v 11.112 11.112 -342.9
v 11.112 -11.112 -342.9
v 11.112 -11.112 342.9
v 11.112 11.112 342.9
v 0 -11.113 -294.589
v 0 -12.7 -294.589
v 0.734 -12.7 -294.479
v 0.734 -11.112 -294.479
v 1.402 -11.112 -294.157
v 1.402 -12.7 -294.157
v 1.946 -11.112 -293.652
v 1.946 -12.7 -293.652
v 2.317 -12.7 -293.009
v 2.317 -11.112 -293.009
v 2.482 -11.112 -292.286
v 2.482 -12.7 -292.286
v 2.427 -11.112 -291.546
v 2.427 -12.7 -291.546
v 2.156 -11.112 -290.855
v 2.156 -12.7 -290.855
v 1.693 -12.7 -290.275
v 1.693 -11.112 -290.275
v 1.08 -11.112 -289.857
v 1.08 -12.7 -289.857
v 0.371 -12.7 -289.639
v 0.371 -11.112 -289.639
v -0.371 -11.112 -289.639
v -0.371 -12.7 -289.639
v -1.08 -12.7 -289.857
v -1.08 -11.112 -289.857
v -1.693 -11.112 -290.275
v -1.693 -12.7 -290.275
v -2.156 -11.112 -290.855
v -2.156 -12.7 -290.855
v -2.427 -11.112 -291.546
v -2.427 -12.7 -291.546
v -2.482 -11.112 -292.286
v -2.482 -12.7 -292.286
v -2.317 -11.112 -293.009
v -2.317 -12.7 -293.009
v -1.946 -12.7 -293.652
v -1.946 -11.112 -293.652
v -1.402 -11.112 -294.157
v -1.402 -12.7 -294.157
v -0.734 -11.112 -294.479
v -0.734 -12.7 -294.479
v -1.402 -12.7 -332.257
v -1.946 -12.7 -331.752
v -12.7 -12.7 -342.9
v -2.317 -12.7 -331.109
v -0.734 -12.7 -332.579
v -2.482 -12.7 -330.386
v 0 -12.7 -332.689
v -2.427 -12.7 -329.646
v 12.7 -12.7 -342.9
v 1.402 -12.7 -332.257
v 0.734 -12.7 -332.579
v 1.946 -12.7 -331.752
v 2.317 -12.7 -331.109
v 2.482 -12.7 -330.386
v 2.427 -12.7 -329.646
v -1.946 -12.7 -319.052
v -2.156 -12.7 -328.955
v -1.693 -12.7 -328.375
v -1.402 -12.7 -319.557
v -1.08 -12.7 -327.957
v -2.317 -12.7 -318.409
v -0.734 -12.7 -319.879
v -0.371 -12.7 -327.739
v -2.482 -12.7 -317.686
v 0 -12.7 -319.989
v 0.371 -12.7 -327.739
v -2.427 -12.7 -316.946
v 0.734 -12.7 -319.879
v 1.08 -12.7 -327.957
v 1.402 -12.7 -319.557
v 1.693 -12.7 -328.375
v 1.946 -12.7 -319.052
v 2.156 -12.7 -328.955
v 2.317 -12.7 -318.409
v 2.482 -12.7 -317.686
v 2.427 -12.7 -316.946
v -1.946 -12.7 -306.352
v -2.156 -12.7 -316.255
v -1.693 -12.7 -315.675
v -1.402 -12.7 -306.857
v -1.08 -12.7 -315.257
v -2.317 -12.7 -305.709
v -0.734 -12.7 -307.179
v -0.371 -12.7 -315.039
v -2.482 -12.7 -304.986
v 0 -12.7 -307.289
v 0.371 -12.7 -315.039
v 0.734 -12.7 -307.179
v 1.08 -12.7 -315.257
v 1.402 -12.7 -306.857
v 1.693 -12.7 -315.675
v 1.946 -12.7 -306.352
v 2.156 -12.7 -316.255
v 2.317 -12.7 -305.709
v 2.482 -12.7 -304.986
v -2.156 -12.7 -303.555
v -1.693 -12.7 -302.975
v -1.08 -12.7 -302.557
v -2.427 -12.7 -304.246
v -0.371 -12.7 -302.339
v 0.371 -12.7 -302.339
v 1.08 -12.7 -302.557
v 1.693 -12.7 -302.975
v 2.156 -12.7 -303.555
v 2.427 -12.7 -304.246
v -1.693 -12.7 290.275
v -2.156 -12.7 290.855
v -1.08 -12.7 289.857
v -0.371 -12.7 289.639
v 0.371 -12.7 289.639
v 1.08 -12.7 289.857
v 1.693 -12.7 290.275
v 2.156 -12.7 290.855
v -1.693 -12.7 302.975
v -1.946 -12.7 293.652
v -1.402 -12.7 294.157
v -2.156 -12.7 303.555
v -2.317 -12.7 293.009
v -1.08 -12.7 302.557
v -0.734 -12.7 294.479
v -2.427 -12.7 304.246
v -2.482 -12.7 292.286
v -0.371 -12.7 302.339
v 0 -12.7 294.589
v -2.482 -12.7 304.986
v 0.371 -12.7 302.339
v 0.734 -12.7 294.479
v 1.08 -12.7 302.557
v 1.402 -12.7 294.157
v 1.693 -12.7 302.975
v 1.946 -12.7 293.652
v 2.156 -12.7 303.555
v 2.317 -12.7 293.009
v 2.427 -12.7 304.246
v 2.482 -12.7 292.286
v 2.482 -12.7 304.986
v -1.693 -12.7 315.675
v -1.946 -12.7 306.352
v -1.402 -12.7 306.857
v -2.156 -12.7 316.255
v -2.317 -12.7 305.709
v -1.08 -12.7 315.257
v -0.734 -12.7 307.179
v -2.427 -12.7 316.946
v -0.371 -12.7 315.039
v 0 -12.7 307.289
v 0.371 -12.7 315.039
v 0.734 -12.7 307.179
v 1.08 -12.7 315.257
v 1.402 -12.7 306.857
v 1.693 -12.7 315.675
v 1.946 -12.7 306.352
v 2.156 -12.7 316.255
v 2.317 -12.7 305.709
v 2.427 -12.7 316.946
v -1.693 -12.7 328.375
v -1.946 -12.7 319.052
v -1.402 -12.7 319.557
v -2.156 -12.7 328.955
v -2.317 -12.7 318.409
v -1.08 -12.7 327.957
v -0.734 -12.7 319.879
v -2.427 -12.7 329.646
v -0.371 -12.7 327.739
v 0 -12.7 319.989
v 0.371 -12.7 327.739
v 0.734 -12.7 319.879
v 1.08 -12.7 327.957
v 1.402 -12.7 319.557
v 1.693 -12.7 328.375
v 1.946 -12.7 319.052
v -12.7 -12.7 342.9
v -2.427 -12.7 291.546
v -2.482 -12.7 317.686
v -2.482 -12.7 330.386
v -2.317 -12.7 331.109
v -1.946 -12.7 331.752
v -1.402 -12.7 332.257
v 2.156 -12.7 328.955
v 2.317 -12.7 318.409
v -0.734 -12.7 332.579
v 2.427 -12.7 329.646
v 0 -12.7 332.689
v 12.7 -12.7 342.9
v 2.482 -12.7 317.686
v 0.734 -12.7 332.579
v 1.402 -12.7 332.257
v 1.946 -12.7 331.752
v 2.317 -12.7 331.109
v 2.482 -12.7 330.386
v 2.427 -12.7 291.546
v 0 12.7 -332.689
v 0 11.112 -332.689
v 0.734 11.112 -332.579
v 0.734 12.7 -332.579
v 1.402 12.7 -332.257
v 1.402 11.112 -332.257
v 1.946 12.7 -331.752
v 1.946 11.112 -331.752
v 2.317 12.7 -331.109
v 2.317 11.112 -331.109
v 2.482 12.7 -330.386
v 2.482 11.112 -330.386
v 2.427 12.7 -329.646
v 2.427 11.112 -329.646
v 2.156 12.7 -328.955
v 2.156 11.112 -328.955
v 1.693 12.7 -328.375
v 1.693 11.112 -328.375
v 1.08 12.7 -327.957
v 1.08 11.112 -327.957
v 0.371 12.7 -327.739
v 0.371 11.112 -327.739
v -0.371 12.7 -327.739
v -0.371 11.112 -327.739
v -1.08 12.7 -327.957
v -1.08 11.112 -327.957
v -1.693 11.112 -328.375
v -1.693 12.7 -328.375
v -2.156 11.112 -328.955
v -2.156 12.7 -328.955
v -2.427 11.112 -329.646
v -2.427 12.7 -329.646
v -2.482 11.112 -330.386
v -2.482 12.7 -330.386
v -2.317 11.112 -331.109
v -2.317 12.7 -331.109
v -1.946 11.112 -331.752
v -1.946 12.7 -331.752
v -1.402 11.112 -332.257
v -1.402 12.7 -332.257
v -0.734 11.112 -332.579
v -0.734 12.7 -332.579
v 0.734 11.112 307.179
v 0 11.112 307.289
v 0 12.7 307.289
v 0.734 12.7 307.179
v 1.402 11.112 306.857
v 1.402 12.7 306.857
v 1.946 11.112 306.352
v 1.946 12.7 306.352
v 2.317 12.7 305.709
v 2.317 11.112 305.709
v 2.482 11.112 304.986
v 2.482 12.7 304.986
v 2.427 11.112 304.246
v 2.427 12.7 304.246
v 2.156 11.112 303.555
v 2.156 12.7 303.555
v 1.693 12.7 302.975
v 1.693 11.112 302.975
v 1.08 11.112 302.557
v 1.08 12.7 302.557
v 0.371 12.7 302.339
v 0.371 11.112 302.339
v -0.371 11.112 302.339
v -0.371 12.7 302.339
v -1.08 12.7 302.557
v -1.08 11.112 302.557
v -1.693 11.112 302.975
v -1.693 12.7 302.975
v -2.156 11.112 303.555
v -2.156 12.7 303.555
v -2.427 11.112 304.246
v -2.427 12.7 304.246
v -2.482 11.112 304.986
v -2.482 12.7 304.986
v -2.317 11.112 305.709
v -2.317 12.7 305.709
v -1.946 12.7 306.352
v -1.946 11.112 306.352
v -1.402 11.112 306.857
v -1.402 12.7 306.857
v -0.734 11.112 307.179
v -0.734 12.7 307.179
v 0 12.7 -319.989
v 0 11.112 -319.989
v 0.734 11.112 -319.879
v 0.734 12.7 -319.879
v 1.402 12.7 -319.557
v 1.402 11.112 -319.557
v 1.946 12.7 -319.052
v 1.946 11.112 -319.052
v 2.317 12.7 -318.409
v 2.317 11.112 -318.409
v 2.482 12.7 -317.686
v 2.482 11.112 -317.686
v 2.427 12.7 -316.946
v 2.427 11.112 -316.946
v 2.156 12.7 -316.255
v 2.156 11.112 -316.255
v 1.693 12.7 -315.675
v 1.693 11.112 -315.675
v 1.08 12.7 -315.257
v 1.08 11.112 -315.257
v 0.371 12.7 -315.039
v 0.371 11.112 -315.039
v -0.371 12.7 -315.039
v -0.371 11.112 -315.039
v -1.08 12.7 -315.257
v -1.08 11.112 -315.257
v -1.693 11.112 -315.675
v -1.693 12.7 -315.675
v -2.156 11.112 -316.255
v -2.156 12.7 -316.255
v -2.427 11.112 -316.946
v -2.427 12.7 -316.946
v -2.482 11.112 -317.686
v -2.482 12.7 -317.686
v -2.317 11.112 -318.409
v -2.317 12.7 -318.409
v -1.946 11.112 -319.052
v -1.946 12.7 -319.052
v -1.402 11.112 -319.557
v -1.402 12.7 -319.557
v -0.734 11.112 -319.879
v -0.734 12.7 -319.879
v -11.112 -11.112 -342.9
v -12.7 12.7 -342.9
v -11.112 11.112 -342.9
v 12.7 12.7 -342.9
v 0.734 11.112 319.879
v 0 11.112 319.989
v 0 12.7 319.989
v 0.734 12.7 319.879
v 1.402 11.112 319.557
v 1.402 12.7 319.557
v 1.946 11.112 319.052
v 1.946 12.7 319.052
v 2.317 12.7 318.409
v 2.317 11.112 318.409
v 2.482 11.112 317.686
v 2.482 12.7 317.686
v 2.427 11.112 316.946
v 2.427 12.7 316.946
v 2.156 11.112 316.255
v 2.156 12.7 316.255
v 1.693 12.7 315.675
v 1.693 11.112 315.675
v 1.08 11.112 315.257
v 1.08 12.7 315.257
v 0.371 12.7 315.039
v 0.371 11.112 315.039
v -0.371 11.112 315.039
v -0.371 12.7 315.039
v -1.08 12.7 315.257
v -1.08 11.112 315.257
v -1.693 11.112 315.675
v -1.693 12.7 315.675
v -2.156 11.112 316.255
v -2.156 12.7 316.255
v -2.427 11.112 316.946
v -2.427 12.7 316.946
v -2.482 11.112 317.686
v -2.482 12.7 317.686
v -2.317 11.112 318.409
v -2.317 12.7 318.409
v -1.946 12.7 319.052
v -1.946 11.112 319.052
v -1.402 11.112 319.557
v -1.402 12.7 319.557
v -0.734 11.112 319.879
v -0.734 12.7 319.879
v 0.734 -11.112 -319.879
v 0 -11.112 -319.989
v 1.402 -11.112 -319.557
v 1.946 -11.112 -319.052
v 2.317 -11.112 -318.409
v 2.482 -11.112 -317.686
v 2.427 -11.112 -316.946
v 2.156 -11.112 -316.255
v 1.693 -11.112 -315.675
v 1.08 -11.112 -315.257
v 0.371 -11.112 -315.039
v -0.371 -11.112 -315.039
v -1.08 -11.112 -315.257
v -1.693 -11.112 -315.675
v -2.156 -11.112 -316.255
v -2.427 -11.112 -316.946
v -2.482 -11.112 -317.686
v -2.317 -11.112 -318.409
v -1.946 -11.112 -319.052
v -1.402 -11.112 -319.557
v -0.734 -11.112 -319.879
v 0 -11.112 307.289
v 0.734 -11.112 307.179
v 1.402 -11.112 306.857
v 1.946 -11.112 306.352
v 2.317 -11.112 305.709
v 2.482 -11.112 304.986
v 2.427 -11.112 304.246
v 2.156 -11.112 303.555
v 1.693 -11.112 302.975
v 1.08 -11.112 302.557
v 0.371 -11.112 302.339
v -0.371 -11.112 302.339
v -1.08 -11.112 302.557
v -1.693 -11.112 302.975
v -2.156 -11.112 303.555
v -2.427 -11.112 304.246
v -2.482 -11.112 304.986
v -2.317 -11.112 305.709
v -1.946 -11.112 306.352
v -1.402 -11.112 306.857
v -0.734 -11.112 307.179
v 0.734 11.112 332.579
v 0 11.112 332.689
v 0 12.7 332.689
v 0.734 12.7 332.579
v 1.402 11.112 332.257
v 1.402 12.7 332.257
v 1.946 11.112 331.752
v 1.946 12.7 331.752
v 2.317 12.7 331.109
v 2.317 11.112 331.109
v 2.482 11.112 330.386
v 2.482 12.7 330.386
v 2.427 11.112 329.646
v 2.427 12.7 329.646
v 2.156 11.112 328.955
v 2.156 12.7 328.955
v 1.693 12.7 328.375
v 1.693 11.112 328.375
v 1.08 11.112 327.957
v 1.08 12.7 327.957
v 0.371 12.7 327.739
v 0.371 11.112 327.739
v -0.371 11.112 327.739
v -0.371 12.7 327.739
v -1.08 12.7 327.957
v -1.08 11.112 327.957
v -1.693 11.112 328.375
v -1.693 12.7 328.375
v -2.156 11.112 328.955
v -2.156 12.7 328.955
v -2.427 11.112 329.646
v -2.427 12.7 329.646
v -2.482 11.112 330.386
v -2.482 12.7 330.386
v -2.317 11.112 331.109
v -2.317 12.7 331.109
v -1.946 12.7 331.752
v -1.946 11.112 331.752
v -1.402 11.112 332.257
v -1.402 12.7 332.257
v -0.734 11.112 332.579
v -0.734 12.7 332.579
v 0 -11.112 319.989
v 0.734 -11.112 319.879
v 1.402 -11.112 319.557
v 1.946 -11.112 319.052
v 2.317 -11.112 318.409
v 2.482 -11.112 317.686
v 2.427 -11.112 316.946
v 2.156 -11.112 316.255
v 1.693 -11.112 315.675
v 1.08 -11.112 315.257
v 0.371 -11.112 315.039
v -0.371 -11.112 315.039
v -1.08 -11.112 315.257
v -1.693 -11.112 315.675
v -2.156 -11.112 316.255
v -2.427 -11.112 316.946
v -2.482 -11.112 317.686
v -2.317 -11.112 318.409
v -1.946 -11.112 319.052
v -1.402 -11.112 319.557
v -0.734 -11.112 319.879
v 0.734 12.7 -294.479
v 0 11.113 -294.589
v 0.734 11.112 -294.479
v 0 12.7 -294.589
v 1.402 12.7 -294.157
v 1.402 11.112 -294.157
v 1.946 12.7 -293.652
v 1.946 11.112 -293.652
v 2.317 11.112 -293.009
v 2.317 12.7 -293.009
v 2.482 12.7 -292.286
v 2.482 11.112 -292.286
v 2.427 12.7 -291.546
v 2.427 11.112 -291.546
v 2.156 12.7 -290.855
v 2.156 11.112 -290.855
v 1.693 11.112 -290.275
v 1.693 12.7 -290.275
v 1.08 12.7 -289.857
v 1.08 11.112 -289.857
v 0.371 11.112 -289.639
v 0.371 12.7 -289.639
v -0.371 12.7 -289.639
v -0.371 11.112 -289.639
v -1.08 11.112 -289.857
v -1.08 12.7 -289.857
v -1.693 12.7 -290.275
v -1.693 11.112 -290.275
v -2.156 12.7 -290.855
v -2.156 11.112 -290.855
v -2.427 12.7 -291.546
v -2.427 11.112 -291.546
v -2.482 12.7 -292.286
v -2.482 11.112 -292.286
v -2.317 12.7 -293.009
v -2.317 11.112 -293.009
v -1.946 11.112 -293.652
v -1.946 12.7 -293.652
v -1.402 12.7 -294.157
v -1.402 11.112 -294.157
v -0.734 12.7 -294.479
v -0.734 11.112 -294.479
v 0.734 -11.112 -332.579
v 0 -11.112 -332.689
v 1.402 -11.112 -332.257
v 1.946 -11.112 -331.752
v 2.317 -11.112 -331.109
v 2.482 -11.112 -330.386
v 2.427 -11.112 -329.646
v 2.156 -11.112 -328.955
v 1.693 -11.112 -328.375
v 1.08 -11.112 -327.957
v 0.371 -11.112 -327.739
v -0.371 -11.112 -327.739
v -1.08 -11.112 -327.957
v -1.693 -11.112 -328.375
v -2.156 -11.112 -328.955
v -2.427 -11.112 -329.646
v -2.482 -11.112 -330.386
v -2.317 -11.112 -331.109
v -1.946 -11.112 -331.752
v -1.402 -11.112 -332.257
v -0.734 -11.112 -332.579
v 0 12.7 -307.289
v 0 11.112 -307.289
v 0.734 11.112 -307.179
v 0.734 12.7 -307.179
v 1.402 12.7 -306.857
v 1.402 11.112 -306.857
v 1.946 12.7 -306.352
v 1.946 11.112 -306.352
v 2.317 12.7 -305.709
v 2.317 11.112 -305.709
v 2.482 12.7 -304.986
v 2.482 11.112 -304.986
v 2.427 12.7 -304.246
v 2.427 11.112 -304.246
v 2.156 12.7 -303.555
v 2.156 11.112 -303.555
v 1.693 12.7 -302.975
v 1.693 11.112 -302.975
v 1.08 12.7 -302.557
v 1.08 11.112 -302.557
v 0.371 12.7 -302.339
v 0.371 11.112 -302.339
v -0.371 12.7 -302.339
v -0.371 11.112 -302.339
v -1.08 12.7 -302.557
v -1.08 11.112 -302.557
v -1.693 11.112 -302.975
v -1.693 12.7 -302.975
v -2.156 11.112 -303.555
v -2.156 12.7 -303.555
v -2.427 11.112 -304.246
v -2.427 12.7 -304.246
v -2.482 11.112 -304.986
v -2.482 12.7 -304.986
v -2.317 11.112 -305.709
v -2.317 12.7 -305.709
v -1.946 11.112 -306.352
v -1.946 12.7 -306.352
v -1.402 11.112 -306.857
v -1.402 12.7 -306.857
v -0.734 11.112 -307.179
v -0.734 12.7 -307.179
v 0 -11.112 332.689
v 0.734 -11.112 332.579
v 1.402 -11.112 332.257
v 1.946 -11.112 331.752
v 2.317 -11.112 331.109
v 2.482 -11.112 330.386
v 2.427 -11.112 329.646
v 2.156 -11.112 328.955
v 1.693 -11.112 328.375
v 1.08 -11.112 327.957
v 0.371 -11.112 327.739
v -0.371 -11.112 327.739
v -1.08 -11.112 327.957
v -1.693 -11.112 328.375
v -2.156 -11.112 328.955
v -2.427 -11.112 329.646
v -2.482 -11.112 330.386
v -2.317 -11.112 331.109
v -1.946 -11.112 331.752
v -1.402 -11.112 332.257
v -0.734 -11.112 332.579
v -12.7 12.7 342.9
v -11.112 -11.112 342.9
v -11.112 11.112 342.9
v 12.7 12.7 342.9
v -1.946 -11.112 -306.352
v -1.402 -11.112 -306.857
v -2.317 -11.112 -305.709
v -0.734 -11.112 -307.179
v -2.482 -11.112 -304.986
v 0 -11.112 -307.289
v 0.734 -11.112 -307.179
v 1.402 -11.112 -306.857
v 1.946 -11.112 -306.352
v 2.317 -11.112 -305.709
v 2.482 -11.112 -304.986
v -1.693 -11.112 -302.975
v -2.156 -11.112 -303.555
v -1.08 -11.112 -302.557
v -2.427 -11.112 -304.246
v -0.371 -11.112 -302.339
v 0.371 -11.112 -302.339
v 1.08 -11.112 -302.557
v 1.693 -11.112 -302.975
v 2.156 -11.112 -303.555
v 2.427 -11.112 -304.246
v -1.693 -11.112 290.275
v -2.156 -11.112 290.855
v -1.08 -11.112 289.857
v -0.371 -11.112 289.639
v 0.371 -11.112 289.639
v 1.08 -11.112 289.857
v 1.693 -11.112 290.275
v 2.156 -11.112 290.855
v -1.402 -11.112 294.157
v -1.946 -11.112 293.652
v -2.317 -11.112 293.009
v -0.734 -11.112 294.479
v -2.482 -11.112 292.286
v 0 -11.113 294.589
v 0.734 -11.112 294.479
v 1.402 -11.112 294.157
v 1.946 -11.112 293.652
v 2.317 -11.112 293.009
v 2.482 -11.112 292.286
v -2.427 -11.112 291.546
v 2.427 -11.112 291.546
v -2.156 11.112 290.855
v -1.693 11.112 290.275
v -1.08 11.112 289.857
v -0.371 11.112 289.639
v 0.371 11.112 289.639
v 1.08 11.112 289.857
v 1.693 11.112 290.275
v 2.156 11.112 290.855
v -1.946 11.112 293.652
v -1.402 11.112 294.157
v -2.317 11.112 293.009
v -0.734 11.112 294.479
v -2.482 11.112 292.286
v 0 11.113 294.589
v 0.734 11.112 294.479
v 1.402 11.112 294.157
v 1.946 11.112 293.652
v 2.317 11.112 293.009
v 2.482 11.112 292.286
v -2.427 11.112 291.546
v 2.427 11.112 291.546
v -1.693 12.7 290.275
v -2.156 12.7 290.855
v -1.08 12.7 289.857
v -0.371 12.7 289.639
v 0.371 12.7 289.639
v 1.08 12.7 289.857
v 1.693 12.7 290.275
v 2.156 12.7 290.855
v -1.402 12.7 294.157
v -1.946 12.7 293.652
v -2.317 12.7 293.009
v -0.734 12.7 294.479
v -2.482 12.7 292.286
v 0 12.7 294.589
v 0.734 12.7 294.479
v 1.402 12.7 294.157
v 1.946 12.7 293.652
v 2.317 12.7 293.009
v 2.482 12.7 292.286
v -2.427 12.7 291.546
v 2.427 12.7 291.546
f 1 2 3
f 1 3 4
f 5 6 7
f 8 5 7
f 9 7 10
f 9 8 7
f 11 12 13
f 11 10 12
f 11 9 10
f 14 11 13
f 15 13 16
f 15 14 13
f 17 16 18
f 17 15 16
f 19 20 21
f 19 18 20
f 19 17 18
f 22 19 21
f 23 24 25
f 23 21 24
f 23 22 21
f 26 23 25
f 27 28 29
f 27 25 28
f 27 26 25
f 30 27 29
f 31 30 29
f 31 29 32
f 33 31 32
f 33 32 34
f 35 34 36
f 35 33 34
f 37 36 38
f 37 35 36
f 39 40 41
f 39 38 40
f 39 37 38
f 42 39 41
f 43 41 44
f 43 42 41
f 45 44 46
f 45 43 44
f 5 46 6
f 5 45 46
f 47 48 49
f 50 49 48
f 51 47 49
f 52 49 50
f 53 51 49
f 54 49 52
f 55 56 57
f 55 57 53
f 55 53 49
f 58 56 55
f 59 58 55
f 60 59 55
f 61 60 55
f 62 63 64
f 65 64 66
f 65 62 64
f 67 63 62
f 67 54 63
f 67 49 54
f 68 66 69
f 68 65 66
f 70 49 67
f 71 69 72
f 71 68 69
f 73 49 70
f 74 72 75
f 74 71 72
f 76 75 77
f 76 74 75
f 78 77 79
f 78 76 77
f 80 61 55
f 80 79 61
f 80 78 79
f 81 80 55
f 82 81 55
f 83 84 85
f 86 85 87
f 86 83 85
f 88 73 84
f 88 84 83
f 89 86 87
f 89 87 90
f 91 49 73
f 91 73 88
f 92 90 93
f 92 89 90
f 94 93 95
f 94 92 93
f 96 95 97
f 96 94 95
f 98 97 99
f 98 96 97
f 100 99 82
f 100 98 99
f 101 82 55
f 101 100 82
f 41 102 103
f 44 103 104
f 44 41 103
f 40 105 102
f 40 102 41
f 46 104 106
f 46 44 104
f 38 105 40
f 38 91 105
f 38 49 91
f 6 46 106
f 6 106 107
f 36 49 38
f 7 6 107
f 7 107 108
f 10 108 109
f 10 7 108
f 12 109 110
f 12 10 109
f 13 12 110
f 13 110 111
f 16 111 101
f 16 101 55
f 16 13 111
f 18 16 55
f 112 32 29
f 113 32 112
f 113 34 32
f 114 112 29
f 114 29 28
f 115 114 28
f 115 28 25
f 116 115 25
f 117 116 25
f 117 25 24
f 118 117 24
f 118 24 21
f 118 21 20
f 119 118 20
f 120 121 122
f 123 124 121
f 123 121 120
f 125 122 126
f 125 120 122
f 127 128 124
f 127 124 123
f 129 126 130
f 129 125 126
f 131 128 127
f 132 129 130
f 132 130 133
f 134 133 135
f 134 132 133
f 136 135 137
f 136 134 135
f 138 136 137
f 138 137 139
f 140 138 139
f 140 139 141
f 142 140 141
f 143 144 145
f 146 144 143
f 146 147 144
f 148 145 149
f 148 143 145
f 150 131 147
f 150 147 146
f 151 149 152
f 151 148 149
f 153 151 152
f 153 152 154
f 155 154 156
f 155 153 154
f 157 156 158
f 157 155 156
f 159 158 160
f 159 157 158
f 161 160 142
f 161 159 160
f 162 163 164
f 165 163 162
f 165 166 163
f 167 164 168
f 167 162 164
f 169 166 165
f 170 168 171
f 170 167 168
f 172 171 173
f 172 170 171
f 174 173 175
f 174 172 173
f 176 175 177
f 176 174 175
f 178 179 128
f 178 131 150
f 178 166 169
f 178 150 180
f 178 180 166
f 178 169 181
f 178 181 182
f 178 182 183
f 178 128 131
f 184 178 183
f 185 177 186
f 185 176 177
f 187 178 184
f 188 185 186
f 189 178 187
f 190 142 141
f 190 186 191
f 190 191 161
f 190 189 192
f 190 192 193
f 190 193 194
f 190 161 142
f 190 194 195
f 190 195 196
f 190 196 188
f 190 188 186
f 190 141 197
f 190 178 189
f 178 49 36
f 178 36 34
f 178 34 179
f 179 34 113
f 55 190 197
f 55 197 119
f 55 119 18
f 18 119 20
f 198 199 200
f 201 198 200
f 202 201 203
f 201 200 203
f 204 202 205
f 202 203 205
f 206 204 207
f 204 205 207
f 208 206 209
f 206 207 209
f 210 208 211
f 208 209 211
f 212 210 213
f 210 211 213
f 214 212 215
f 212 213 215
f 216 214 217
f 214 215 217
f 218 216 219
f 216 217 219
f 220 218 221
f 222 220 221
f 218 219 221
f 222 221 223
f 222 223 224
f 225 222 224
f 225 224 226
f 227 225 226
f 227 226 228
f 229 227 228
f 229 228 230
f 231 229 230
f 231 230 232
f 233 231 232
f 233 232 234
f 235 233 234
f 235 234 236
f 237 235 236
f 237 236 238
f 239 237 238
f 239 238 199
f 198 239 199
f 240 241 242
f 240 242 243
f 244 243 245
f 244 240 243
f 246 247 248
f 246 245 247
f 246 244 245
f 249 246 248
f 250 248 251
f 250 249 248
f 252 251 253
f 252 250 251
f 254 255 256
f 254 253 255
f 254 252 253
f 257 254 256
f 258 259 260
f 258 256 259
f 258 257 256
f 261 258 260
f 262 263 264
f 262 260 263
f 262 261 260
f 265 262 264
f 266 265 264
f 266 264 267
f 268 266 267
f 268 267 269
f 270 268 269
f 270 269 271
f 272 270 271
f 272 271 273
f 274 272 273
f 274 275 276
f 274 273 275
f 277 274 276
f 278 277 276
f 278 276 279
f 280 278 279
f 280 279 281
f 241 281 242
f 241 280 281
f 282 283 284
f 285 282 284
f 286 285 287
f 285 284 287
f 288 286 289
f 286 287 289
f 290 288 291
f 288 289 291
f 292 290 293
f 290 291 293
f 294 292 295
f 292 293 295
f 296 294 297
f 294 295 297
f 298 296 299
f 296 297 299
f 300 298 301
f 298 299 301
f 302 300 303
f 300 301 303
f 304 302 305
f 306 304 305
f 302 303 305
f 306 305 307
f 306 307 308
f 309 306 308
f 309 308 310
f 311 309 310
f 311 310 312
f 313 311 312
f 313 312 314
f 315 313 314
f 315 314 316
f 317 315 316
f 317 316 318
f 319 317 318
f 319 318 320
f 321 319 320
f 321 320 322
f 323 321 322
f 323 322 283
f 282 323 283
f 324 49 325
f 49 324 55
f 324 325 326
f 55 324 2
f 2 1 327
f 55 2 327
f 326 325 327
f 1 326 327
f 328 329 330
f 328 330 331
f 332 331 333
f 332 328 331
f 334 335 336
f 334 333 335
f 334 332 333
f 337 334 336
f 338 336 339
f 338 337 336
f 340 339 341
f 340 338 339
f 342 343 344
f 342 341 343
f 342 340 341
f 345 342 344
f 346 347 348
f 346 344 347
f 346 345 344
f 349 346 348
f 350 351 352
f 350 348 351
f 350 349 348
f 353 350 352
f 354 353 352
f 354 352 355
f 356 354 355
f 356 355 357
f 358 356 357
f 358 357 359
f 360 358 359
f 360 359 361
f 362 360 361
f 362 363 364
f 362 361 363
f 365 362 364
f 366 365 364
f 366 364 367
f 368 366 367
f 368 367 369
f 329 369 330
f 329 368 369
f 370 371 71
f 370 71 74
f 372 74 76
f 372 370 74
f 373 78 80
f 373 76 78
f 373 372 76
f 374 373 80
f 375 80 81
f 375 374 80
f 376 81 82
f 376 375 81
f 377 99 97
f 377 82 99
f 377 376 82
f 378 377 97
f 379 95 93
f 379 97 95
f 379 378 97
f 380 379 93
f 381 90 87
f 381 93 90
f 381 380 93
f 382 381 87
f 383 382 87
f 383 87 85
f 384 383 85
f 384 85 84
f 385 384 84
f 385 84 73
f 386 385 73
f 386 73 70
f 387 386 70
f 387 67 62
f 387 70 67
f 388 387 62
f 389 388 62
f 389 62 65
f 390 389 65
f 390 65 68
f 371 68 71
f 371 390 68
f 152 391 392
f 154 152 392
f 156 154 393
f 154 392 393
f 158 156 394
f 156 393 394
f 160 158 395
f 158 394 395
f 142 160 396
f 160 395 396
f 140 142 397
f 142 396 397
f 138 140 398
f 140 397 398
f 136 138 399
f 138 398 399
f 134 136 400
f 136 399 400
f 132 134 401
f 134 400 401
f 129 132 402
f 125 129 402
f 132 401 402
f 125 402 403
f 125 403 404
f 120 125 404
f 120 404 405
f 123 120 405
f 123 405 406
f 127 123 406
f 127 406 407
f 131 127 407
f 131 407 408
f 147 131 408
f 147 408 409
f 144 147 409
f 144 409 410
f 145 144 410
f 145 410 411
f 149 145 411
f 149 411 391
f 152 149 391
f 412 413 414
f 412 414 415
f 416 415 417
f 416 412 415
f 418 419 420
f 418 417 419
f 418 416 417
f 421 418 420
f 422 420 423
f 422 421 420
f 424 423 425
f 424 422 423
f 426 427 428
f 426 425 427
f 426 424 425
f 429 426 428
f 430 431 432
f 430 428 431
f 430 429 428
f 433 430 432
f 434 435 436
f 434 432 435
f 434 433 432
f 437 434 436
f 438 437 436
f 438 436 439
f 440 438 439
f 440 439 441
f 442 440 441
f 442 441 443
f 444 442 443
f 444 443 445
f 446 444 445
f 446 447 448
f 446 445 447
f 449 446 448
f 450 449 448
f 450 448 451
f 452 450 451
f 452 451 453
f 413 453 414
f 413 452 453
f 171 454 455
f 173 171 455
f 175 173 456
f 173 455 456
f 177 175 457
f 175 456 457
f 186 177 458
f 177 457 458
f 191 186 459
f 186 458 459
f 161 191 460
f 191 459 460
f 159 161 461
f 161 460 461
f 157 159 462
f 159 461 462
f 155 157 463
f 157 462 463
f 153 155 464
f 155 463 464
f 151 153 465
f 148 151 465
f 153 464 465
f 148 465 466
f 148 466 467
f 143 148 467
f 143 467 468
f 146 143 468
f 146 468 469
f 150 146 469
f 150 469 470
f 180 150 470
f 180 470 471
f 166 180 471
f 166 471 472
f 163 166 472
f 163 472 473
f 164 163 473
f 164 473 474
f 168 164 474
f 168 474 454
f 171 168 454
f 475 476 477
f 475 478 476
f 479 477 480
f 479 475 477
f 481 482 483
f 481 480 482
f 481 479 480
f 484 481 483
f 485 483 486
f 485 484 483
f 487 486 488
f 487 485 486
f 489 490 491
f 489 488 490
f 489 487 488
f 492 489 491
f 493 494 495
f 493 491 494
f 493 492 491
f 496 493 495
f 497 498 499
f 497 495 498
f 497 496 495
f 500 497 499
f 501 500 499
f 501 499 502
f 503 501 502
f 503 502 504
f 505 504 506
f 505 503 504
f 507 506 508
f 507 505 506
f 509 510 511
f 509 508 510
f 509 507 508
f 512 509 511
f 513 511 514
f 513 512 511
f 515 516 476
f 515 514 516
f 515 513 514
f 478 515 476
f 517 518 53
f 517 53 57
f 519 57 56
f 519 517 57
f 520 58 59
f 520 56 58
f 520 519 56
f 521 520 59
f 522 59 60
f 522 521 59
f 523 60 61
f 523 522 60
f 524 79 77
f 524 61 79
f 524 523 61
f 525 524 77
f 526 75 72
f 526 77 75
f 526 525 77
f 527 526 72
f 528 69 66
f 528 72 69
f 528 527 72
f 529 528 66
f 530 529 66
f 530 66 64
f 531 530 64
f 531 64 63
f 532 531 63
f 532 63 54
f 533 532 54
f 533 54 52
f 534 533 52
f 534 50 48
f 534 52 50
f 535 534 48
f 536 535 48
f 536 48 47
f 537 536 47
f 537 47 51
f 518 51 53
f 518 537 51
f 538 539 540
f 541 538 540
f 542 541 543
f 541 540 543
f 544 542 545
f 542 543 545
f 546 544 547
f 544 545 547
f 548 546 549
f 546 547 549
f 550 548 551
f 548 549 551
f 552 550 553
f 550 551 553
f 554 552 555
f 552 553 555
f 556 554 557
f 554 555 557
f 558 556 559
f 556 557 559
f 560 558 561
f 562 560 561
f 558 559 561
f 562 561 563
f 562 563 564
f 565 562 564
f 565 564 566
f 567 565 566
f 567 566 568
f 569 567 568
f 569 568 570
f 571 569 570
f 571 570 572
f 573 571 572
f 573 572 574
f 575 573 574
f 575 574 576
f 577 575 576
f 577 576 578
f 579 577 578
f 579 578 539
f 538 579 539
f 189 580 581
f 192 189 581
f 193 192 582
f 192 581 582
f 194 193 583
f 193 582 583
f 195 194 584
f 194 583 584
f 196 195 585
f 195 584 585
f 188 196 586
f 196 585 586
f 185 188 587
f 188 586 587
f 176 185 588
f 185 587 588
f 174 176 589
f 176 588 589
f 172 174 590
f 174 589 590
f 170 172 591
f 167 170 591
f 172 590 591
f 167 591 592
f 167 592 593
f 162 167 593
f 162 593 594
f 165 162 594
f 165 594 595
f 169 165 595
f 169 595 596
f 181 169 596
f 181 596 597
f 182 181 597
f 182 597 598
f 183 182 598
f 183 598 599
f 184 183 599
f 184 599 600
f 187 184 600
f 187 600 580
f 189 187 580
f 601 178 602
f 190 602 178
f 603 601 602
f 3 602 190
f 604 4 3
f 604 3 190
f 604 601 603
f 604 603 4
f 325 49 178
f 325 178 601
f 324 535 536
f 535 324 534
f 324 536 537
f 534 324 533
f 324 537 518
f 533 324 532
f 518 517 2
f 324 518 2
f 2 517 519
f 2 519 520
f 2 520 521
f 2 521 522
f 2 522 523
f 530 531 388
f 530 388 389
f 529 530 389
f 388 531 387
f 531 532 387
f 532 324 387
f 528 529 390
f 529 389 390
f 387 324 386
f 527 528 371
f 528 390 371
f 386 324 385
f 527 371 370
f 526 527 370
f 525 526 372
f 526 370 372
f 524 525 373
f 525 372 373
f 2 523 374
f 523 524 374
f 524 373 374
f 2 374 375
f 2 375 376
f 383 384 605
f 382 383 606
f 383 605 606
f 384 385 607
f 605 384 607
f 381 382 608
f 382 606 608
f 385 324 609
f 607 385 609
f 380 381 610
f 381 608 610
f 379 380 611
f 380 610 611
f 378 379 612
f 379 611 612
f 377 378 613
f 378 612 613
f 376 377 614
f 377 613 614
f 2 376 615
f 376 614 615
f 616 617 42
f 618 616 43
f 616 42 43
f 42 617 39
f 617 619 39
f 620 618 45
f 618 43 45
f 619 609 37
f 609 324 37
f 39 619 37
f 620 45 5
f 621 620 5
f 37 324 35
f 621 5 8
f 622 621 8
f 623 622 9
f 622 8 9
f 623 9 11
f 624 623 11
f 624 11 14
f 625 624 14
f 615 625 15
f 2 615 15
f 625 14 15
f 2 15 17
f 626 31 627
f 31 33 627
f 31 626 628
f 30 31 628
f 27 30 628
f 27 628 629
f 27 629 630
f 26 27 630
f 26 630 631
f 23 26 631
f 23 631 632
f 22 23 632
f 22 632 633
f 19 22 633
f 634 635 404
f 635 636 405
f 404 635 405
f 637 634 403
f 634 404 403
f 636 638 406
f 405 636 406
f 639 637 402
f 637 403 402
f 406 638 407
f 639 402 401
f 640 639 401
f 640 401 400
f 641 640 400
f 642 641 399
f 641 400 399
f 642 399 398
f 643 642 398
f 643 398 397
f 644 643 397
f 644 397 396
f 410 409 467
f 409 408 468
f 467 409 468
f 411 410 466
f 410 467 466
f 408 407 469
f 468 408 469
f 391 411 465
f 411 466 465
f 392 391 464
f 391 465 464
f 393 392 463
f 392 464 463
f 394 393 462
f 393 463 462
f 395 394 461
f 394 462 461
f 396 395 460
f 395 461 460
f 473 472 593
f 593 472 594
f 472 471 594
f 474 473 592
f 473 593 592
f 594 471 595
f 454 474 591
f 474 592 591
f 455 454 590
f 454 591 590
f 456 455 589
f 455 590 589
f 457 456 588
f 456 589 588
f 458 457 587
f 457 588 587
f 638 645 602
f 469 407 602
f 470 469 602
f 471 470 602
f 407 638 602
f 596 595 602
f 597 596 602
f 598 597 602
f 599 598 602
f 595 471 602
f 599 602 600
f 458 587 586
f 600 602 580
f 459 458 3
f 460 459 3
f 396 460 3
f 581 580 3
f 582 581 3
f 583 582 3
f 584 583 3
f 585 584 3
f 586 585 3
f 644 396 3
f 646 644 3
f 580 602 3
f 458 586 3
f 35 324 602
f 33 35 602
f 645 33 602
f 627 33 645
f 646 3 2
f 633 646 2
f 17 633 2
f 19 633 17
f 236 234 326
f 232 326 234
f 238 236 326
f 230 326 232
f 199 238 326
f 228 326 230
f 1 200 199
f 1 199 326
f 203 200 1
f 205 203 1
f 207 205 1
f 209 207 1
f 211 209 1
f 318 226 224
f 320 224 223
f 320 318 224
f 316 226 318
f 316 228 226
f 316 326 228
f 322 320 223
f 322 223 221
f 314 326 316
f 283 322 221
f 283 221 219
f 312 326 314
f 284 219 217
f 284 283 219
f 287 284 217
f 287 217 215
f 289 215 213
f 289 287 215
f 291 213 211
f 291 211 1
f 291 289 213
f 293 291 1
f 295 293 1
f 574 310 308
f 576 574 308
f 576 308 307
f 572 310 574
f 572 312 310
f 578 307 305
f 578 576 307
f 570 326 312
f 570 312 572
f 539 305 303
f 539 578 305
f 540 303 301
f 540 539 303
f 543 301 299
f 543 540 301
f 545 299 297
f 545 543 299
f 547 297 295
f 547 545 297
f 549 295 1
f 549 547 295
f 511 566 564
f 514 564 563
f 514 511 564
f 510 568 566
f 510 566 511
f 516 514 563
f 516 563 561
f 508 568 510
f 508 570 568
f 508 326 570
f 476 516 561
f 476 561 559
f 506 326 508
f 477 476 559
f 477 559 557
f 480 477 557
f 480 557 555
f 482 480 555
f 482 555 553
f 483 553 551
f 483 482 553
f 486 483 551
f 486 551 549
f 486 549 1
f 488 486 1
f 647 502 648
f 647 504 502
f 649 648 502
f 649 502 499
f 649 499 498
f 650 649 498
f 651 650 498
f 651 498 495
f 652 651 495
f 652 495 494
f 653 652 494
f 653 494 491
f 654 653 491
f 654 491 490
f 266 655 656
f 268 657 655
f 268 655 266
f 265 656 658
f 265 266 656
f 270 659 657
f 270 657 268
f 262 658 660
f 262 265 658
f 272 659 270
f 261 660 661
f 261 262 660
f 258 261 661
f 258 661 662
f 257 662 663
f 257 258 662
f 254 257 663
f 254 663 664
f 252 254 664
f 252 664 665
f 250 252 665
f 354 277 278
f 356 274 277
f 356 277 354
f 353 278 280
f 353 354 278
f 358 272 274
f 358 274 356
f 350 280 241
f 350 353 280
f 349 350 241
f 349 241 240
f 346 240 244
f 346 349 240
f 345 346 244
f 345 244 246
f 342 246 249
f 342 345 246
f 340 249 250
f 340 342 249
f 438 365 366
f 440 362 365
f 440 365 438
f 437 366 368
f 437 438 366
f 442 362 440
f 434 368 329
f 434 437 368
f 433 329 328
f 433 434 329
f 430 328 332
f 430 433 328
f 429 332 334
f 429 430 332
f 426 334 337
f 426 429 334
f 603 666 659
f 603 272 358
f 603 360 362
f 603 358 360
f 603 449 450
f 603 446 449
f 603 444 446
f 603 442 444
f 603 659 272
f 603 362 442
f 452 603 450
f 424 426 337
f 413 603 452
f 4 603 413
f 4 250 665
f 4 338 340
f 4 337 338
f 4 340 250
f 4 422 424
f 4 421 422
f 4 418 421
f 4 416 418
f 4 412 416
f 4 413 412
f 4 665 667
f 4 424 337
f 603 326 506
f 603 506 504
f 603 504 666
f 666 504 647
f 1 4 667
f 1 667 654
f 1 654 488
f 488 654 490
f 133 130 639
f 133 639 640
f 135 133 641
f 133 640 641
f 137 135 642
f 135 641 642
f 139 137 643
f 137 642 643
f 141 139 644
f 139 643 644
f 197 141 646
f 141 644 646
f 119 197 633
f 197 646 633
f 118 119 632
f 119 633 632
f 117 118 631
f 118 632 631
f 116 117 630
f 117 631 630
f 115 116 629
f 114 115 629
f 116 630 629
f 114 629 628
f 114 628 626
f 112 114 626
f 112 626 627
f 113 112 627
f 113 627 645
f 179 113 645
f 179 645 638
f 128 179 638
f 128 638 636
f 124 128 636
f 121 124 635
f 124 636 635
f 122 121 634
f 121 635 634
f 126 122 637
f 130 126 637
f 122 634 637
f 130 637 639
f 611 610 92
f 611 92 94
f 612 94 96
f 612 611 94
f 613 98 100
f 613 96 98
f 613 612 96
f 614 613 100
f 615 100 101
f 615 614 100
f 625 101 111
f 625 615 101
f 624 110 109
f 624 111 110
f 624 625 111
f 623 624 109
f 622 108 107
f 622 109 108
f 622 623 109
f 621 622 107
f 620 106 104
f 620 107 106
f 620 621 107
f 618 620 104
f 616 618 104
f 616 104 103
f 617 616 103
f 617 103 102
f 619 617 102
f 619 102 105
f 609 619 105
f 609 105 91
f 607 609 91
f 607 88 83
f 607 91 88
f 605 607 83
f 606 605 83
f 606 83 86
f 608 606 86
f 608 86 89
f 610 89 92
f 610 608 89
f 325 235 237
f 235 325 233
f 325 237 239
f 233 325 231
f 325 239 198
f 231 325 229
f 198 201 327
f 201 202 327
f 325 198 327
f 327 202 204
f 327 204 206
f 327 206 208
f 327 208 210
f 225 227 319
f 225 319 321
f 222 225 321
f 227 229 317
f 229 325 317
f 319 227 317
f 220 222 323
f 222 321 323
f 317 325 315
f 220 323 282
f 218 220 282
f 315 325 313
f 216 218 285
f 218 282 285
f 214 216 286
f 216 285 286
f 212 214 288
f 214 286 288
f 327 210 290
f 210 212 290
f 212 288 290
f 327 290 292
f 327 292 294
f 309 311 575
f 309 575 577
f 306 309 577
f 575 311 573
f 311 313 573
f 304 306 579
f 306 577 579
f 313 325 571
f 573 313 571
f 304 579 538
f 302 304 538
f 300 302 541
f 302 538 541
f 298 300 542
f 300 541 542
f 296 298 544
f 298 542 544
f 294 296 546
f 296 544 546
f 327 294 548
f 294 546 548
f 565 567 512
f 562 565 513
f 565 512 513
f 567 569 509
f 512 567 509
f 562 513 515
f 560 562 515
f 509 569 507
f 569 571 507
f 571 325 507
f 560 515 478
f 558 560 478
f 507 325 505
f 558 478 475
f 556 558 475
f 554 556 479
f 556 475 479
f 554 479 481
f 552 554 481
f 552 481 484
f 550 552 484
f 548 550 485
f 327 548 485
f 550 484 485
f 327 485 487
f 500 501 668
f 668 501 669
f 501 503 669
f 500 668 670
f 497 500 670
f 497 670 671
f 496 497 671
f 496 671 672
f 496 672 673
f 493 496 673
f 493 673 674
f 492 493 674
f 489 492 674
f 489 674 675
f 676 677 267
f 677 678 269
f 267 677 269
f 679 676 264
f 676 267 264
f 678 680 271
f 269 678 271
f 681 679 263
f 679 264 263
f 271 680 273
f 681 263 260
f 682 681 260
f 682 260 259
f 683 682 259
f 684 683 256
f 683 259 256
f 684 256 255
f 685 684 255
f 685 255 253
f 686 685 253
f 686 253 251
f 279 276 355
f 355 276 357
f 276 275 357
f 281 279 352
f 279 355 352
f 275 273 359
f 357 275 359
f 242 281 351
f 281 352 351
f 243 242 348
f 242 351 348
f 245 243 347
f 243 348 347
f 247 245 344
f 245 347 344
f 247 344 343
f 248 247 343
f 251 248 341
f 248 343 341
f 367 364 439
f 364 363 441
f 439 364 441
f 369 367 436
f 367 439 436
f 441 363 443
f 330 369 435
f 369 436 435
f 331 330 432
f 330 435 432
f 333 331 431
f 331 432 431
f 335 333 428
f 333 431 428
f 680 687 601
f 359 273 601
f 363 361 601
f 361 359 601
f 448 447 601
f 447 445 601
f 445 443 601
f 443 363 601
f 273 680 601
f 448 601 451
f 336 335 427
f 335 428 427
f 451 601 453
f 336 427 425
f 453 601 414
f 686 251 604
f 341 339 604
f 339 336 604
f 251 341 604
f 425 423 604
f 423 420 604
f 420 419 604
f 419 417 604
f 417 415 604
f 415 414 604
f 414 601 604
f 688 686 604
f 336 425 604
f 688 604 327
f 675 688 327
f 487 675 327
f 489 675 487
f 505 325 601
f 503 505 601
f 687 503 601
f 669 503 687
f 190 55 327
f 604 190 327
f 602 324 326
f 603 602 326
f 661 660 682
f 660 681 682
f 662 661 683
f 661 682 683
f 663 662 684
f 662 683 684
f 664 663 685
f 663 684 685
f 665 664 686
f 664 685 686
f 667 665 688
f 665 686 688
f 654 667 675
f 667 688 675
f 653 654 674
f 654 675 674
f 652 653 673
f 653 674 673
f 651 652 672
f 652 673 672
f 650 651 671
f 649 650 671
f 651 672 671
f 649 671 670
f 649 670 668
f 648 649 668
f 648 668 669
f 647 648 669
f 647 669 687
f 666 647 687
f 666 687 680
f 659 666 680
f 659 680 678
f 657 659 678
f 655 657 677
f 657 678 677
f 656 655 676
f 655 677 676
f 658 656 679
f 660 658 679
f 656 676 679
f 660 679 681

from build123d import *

# Parameters (mm, degrees)
SKETCH1_W           = 25.4
SKETCH1_H           = 25.4
BOSS_EXTRUDE1_DEPTH = 342.9
SHELL1_T            = -1.5875
SKETCH2_R           = 2.4892
CUT_EXTRUDE1_DEPTH  = 344.370048199


with BuildPart() as part:
    # Sketch1 → Boss-Extrude1 (new, symmetric)
    with BuildSketch(Plane.XY):
        Rectangle(SKETCH1_W, SKETCH1_H)
    extrude(amount=BOSS_EXTRUDE1_DEPTH, both=True)

    # Shell1
    shell1_openings = [part.faces().sort_by_distance(p)[0] for p in [
        (0, 0, 342.9),
        (0, 0, -342.9),
    ]]
    offset(amount=SHELL1_T, openings=shell1_openings, kind=Kind.INTERSECTION)

    # Sketch2 → Cut-Extrude1 (cut, symmetric)
    with BuildSketch(Plane(origin=(0, 0, 0), x_dir=(1, 0, 0), z_dir=(0, 1, 0))):
        with Locations(Location((0, -330.2, 0), (0, 0, 270))):
            Circle(SKETCH2_R)
        with Locations(Location((0, -317.5, 0), (0, 0, 270))):
            Circle(SKETCH2_R)
        with Locations(Location((0, -304.8, 0), (0, 0, 270))):
            Circle(SKETCH2_R)
        with Locations(Location((0, -292.1, 0), (0, 0, 270))):
            Circle(SKETCH2_R)
    cut_extrude1 = extrude(amount=CUT_EXTRUDE1_DEPTH, both=True, mode=Mode.SUBTRACT)

    # Mirror1: Cut-Extrude1 across plane
    add(cut_extrude1.mirror(Plane.XY), mode=Mode.SUBTRACT)


solid = part.part
